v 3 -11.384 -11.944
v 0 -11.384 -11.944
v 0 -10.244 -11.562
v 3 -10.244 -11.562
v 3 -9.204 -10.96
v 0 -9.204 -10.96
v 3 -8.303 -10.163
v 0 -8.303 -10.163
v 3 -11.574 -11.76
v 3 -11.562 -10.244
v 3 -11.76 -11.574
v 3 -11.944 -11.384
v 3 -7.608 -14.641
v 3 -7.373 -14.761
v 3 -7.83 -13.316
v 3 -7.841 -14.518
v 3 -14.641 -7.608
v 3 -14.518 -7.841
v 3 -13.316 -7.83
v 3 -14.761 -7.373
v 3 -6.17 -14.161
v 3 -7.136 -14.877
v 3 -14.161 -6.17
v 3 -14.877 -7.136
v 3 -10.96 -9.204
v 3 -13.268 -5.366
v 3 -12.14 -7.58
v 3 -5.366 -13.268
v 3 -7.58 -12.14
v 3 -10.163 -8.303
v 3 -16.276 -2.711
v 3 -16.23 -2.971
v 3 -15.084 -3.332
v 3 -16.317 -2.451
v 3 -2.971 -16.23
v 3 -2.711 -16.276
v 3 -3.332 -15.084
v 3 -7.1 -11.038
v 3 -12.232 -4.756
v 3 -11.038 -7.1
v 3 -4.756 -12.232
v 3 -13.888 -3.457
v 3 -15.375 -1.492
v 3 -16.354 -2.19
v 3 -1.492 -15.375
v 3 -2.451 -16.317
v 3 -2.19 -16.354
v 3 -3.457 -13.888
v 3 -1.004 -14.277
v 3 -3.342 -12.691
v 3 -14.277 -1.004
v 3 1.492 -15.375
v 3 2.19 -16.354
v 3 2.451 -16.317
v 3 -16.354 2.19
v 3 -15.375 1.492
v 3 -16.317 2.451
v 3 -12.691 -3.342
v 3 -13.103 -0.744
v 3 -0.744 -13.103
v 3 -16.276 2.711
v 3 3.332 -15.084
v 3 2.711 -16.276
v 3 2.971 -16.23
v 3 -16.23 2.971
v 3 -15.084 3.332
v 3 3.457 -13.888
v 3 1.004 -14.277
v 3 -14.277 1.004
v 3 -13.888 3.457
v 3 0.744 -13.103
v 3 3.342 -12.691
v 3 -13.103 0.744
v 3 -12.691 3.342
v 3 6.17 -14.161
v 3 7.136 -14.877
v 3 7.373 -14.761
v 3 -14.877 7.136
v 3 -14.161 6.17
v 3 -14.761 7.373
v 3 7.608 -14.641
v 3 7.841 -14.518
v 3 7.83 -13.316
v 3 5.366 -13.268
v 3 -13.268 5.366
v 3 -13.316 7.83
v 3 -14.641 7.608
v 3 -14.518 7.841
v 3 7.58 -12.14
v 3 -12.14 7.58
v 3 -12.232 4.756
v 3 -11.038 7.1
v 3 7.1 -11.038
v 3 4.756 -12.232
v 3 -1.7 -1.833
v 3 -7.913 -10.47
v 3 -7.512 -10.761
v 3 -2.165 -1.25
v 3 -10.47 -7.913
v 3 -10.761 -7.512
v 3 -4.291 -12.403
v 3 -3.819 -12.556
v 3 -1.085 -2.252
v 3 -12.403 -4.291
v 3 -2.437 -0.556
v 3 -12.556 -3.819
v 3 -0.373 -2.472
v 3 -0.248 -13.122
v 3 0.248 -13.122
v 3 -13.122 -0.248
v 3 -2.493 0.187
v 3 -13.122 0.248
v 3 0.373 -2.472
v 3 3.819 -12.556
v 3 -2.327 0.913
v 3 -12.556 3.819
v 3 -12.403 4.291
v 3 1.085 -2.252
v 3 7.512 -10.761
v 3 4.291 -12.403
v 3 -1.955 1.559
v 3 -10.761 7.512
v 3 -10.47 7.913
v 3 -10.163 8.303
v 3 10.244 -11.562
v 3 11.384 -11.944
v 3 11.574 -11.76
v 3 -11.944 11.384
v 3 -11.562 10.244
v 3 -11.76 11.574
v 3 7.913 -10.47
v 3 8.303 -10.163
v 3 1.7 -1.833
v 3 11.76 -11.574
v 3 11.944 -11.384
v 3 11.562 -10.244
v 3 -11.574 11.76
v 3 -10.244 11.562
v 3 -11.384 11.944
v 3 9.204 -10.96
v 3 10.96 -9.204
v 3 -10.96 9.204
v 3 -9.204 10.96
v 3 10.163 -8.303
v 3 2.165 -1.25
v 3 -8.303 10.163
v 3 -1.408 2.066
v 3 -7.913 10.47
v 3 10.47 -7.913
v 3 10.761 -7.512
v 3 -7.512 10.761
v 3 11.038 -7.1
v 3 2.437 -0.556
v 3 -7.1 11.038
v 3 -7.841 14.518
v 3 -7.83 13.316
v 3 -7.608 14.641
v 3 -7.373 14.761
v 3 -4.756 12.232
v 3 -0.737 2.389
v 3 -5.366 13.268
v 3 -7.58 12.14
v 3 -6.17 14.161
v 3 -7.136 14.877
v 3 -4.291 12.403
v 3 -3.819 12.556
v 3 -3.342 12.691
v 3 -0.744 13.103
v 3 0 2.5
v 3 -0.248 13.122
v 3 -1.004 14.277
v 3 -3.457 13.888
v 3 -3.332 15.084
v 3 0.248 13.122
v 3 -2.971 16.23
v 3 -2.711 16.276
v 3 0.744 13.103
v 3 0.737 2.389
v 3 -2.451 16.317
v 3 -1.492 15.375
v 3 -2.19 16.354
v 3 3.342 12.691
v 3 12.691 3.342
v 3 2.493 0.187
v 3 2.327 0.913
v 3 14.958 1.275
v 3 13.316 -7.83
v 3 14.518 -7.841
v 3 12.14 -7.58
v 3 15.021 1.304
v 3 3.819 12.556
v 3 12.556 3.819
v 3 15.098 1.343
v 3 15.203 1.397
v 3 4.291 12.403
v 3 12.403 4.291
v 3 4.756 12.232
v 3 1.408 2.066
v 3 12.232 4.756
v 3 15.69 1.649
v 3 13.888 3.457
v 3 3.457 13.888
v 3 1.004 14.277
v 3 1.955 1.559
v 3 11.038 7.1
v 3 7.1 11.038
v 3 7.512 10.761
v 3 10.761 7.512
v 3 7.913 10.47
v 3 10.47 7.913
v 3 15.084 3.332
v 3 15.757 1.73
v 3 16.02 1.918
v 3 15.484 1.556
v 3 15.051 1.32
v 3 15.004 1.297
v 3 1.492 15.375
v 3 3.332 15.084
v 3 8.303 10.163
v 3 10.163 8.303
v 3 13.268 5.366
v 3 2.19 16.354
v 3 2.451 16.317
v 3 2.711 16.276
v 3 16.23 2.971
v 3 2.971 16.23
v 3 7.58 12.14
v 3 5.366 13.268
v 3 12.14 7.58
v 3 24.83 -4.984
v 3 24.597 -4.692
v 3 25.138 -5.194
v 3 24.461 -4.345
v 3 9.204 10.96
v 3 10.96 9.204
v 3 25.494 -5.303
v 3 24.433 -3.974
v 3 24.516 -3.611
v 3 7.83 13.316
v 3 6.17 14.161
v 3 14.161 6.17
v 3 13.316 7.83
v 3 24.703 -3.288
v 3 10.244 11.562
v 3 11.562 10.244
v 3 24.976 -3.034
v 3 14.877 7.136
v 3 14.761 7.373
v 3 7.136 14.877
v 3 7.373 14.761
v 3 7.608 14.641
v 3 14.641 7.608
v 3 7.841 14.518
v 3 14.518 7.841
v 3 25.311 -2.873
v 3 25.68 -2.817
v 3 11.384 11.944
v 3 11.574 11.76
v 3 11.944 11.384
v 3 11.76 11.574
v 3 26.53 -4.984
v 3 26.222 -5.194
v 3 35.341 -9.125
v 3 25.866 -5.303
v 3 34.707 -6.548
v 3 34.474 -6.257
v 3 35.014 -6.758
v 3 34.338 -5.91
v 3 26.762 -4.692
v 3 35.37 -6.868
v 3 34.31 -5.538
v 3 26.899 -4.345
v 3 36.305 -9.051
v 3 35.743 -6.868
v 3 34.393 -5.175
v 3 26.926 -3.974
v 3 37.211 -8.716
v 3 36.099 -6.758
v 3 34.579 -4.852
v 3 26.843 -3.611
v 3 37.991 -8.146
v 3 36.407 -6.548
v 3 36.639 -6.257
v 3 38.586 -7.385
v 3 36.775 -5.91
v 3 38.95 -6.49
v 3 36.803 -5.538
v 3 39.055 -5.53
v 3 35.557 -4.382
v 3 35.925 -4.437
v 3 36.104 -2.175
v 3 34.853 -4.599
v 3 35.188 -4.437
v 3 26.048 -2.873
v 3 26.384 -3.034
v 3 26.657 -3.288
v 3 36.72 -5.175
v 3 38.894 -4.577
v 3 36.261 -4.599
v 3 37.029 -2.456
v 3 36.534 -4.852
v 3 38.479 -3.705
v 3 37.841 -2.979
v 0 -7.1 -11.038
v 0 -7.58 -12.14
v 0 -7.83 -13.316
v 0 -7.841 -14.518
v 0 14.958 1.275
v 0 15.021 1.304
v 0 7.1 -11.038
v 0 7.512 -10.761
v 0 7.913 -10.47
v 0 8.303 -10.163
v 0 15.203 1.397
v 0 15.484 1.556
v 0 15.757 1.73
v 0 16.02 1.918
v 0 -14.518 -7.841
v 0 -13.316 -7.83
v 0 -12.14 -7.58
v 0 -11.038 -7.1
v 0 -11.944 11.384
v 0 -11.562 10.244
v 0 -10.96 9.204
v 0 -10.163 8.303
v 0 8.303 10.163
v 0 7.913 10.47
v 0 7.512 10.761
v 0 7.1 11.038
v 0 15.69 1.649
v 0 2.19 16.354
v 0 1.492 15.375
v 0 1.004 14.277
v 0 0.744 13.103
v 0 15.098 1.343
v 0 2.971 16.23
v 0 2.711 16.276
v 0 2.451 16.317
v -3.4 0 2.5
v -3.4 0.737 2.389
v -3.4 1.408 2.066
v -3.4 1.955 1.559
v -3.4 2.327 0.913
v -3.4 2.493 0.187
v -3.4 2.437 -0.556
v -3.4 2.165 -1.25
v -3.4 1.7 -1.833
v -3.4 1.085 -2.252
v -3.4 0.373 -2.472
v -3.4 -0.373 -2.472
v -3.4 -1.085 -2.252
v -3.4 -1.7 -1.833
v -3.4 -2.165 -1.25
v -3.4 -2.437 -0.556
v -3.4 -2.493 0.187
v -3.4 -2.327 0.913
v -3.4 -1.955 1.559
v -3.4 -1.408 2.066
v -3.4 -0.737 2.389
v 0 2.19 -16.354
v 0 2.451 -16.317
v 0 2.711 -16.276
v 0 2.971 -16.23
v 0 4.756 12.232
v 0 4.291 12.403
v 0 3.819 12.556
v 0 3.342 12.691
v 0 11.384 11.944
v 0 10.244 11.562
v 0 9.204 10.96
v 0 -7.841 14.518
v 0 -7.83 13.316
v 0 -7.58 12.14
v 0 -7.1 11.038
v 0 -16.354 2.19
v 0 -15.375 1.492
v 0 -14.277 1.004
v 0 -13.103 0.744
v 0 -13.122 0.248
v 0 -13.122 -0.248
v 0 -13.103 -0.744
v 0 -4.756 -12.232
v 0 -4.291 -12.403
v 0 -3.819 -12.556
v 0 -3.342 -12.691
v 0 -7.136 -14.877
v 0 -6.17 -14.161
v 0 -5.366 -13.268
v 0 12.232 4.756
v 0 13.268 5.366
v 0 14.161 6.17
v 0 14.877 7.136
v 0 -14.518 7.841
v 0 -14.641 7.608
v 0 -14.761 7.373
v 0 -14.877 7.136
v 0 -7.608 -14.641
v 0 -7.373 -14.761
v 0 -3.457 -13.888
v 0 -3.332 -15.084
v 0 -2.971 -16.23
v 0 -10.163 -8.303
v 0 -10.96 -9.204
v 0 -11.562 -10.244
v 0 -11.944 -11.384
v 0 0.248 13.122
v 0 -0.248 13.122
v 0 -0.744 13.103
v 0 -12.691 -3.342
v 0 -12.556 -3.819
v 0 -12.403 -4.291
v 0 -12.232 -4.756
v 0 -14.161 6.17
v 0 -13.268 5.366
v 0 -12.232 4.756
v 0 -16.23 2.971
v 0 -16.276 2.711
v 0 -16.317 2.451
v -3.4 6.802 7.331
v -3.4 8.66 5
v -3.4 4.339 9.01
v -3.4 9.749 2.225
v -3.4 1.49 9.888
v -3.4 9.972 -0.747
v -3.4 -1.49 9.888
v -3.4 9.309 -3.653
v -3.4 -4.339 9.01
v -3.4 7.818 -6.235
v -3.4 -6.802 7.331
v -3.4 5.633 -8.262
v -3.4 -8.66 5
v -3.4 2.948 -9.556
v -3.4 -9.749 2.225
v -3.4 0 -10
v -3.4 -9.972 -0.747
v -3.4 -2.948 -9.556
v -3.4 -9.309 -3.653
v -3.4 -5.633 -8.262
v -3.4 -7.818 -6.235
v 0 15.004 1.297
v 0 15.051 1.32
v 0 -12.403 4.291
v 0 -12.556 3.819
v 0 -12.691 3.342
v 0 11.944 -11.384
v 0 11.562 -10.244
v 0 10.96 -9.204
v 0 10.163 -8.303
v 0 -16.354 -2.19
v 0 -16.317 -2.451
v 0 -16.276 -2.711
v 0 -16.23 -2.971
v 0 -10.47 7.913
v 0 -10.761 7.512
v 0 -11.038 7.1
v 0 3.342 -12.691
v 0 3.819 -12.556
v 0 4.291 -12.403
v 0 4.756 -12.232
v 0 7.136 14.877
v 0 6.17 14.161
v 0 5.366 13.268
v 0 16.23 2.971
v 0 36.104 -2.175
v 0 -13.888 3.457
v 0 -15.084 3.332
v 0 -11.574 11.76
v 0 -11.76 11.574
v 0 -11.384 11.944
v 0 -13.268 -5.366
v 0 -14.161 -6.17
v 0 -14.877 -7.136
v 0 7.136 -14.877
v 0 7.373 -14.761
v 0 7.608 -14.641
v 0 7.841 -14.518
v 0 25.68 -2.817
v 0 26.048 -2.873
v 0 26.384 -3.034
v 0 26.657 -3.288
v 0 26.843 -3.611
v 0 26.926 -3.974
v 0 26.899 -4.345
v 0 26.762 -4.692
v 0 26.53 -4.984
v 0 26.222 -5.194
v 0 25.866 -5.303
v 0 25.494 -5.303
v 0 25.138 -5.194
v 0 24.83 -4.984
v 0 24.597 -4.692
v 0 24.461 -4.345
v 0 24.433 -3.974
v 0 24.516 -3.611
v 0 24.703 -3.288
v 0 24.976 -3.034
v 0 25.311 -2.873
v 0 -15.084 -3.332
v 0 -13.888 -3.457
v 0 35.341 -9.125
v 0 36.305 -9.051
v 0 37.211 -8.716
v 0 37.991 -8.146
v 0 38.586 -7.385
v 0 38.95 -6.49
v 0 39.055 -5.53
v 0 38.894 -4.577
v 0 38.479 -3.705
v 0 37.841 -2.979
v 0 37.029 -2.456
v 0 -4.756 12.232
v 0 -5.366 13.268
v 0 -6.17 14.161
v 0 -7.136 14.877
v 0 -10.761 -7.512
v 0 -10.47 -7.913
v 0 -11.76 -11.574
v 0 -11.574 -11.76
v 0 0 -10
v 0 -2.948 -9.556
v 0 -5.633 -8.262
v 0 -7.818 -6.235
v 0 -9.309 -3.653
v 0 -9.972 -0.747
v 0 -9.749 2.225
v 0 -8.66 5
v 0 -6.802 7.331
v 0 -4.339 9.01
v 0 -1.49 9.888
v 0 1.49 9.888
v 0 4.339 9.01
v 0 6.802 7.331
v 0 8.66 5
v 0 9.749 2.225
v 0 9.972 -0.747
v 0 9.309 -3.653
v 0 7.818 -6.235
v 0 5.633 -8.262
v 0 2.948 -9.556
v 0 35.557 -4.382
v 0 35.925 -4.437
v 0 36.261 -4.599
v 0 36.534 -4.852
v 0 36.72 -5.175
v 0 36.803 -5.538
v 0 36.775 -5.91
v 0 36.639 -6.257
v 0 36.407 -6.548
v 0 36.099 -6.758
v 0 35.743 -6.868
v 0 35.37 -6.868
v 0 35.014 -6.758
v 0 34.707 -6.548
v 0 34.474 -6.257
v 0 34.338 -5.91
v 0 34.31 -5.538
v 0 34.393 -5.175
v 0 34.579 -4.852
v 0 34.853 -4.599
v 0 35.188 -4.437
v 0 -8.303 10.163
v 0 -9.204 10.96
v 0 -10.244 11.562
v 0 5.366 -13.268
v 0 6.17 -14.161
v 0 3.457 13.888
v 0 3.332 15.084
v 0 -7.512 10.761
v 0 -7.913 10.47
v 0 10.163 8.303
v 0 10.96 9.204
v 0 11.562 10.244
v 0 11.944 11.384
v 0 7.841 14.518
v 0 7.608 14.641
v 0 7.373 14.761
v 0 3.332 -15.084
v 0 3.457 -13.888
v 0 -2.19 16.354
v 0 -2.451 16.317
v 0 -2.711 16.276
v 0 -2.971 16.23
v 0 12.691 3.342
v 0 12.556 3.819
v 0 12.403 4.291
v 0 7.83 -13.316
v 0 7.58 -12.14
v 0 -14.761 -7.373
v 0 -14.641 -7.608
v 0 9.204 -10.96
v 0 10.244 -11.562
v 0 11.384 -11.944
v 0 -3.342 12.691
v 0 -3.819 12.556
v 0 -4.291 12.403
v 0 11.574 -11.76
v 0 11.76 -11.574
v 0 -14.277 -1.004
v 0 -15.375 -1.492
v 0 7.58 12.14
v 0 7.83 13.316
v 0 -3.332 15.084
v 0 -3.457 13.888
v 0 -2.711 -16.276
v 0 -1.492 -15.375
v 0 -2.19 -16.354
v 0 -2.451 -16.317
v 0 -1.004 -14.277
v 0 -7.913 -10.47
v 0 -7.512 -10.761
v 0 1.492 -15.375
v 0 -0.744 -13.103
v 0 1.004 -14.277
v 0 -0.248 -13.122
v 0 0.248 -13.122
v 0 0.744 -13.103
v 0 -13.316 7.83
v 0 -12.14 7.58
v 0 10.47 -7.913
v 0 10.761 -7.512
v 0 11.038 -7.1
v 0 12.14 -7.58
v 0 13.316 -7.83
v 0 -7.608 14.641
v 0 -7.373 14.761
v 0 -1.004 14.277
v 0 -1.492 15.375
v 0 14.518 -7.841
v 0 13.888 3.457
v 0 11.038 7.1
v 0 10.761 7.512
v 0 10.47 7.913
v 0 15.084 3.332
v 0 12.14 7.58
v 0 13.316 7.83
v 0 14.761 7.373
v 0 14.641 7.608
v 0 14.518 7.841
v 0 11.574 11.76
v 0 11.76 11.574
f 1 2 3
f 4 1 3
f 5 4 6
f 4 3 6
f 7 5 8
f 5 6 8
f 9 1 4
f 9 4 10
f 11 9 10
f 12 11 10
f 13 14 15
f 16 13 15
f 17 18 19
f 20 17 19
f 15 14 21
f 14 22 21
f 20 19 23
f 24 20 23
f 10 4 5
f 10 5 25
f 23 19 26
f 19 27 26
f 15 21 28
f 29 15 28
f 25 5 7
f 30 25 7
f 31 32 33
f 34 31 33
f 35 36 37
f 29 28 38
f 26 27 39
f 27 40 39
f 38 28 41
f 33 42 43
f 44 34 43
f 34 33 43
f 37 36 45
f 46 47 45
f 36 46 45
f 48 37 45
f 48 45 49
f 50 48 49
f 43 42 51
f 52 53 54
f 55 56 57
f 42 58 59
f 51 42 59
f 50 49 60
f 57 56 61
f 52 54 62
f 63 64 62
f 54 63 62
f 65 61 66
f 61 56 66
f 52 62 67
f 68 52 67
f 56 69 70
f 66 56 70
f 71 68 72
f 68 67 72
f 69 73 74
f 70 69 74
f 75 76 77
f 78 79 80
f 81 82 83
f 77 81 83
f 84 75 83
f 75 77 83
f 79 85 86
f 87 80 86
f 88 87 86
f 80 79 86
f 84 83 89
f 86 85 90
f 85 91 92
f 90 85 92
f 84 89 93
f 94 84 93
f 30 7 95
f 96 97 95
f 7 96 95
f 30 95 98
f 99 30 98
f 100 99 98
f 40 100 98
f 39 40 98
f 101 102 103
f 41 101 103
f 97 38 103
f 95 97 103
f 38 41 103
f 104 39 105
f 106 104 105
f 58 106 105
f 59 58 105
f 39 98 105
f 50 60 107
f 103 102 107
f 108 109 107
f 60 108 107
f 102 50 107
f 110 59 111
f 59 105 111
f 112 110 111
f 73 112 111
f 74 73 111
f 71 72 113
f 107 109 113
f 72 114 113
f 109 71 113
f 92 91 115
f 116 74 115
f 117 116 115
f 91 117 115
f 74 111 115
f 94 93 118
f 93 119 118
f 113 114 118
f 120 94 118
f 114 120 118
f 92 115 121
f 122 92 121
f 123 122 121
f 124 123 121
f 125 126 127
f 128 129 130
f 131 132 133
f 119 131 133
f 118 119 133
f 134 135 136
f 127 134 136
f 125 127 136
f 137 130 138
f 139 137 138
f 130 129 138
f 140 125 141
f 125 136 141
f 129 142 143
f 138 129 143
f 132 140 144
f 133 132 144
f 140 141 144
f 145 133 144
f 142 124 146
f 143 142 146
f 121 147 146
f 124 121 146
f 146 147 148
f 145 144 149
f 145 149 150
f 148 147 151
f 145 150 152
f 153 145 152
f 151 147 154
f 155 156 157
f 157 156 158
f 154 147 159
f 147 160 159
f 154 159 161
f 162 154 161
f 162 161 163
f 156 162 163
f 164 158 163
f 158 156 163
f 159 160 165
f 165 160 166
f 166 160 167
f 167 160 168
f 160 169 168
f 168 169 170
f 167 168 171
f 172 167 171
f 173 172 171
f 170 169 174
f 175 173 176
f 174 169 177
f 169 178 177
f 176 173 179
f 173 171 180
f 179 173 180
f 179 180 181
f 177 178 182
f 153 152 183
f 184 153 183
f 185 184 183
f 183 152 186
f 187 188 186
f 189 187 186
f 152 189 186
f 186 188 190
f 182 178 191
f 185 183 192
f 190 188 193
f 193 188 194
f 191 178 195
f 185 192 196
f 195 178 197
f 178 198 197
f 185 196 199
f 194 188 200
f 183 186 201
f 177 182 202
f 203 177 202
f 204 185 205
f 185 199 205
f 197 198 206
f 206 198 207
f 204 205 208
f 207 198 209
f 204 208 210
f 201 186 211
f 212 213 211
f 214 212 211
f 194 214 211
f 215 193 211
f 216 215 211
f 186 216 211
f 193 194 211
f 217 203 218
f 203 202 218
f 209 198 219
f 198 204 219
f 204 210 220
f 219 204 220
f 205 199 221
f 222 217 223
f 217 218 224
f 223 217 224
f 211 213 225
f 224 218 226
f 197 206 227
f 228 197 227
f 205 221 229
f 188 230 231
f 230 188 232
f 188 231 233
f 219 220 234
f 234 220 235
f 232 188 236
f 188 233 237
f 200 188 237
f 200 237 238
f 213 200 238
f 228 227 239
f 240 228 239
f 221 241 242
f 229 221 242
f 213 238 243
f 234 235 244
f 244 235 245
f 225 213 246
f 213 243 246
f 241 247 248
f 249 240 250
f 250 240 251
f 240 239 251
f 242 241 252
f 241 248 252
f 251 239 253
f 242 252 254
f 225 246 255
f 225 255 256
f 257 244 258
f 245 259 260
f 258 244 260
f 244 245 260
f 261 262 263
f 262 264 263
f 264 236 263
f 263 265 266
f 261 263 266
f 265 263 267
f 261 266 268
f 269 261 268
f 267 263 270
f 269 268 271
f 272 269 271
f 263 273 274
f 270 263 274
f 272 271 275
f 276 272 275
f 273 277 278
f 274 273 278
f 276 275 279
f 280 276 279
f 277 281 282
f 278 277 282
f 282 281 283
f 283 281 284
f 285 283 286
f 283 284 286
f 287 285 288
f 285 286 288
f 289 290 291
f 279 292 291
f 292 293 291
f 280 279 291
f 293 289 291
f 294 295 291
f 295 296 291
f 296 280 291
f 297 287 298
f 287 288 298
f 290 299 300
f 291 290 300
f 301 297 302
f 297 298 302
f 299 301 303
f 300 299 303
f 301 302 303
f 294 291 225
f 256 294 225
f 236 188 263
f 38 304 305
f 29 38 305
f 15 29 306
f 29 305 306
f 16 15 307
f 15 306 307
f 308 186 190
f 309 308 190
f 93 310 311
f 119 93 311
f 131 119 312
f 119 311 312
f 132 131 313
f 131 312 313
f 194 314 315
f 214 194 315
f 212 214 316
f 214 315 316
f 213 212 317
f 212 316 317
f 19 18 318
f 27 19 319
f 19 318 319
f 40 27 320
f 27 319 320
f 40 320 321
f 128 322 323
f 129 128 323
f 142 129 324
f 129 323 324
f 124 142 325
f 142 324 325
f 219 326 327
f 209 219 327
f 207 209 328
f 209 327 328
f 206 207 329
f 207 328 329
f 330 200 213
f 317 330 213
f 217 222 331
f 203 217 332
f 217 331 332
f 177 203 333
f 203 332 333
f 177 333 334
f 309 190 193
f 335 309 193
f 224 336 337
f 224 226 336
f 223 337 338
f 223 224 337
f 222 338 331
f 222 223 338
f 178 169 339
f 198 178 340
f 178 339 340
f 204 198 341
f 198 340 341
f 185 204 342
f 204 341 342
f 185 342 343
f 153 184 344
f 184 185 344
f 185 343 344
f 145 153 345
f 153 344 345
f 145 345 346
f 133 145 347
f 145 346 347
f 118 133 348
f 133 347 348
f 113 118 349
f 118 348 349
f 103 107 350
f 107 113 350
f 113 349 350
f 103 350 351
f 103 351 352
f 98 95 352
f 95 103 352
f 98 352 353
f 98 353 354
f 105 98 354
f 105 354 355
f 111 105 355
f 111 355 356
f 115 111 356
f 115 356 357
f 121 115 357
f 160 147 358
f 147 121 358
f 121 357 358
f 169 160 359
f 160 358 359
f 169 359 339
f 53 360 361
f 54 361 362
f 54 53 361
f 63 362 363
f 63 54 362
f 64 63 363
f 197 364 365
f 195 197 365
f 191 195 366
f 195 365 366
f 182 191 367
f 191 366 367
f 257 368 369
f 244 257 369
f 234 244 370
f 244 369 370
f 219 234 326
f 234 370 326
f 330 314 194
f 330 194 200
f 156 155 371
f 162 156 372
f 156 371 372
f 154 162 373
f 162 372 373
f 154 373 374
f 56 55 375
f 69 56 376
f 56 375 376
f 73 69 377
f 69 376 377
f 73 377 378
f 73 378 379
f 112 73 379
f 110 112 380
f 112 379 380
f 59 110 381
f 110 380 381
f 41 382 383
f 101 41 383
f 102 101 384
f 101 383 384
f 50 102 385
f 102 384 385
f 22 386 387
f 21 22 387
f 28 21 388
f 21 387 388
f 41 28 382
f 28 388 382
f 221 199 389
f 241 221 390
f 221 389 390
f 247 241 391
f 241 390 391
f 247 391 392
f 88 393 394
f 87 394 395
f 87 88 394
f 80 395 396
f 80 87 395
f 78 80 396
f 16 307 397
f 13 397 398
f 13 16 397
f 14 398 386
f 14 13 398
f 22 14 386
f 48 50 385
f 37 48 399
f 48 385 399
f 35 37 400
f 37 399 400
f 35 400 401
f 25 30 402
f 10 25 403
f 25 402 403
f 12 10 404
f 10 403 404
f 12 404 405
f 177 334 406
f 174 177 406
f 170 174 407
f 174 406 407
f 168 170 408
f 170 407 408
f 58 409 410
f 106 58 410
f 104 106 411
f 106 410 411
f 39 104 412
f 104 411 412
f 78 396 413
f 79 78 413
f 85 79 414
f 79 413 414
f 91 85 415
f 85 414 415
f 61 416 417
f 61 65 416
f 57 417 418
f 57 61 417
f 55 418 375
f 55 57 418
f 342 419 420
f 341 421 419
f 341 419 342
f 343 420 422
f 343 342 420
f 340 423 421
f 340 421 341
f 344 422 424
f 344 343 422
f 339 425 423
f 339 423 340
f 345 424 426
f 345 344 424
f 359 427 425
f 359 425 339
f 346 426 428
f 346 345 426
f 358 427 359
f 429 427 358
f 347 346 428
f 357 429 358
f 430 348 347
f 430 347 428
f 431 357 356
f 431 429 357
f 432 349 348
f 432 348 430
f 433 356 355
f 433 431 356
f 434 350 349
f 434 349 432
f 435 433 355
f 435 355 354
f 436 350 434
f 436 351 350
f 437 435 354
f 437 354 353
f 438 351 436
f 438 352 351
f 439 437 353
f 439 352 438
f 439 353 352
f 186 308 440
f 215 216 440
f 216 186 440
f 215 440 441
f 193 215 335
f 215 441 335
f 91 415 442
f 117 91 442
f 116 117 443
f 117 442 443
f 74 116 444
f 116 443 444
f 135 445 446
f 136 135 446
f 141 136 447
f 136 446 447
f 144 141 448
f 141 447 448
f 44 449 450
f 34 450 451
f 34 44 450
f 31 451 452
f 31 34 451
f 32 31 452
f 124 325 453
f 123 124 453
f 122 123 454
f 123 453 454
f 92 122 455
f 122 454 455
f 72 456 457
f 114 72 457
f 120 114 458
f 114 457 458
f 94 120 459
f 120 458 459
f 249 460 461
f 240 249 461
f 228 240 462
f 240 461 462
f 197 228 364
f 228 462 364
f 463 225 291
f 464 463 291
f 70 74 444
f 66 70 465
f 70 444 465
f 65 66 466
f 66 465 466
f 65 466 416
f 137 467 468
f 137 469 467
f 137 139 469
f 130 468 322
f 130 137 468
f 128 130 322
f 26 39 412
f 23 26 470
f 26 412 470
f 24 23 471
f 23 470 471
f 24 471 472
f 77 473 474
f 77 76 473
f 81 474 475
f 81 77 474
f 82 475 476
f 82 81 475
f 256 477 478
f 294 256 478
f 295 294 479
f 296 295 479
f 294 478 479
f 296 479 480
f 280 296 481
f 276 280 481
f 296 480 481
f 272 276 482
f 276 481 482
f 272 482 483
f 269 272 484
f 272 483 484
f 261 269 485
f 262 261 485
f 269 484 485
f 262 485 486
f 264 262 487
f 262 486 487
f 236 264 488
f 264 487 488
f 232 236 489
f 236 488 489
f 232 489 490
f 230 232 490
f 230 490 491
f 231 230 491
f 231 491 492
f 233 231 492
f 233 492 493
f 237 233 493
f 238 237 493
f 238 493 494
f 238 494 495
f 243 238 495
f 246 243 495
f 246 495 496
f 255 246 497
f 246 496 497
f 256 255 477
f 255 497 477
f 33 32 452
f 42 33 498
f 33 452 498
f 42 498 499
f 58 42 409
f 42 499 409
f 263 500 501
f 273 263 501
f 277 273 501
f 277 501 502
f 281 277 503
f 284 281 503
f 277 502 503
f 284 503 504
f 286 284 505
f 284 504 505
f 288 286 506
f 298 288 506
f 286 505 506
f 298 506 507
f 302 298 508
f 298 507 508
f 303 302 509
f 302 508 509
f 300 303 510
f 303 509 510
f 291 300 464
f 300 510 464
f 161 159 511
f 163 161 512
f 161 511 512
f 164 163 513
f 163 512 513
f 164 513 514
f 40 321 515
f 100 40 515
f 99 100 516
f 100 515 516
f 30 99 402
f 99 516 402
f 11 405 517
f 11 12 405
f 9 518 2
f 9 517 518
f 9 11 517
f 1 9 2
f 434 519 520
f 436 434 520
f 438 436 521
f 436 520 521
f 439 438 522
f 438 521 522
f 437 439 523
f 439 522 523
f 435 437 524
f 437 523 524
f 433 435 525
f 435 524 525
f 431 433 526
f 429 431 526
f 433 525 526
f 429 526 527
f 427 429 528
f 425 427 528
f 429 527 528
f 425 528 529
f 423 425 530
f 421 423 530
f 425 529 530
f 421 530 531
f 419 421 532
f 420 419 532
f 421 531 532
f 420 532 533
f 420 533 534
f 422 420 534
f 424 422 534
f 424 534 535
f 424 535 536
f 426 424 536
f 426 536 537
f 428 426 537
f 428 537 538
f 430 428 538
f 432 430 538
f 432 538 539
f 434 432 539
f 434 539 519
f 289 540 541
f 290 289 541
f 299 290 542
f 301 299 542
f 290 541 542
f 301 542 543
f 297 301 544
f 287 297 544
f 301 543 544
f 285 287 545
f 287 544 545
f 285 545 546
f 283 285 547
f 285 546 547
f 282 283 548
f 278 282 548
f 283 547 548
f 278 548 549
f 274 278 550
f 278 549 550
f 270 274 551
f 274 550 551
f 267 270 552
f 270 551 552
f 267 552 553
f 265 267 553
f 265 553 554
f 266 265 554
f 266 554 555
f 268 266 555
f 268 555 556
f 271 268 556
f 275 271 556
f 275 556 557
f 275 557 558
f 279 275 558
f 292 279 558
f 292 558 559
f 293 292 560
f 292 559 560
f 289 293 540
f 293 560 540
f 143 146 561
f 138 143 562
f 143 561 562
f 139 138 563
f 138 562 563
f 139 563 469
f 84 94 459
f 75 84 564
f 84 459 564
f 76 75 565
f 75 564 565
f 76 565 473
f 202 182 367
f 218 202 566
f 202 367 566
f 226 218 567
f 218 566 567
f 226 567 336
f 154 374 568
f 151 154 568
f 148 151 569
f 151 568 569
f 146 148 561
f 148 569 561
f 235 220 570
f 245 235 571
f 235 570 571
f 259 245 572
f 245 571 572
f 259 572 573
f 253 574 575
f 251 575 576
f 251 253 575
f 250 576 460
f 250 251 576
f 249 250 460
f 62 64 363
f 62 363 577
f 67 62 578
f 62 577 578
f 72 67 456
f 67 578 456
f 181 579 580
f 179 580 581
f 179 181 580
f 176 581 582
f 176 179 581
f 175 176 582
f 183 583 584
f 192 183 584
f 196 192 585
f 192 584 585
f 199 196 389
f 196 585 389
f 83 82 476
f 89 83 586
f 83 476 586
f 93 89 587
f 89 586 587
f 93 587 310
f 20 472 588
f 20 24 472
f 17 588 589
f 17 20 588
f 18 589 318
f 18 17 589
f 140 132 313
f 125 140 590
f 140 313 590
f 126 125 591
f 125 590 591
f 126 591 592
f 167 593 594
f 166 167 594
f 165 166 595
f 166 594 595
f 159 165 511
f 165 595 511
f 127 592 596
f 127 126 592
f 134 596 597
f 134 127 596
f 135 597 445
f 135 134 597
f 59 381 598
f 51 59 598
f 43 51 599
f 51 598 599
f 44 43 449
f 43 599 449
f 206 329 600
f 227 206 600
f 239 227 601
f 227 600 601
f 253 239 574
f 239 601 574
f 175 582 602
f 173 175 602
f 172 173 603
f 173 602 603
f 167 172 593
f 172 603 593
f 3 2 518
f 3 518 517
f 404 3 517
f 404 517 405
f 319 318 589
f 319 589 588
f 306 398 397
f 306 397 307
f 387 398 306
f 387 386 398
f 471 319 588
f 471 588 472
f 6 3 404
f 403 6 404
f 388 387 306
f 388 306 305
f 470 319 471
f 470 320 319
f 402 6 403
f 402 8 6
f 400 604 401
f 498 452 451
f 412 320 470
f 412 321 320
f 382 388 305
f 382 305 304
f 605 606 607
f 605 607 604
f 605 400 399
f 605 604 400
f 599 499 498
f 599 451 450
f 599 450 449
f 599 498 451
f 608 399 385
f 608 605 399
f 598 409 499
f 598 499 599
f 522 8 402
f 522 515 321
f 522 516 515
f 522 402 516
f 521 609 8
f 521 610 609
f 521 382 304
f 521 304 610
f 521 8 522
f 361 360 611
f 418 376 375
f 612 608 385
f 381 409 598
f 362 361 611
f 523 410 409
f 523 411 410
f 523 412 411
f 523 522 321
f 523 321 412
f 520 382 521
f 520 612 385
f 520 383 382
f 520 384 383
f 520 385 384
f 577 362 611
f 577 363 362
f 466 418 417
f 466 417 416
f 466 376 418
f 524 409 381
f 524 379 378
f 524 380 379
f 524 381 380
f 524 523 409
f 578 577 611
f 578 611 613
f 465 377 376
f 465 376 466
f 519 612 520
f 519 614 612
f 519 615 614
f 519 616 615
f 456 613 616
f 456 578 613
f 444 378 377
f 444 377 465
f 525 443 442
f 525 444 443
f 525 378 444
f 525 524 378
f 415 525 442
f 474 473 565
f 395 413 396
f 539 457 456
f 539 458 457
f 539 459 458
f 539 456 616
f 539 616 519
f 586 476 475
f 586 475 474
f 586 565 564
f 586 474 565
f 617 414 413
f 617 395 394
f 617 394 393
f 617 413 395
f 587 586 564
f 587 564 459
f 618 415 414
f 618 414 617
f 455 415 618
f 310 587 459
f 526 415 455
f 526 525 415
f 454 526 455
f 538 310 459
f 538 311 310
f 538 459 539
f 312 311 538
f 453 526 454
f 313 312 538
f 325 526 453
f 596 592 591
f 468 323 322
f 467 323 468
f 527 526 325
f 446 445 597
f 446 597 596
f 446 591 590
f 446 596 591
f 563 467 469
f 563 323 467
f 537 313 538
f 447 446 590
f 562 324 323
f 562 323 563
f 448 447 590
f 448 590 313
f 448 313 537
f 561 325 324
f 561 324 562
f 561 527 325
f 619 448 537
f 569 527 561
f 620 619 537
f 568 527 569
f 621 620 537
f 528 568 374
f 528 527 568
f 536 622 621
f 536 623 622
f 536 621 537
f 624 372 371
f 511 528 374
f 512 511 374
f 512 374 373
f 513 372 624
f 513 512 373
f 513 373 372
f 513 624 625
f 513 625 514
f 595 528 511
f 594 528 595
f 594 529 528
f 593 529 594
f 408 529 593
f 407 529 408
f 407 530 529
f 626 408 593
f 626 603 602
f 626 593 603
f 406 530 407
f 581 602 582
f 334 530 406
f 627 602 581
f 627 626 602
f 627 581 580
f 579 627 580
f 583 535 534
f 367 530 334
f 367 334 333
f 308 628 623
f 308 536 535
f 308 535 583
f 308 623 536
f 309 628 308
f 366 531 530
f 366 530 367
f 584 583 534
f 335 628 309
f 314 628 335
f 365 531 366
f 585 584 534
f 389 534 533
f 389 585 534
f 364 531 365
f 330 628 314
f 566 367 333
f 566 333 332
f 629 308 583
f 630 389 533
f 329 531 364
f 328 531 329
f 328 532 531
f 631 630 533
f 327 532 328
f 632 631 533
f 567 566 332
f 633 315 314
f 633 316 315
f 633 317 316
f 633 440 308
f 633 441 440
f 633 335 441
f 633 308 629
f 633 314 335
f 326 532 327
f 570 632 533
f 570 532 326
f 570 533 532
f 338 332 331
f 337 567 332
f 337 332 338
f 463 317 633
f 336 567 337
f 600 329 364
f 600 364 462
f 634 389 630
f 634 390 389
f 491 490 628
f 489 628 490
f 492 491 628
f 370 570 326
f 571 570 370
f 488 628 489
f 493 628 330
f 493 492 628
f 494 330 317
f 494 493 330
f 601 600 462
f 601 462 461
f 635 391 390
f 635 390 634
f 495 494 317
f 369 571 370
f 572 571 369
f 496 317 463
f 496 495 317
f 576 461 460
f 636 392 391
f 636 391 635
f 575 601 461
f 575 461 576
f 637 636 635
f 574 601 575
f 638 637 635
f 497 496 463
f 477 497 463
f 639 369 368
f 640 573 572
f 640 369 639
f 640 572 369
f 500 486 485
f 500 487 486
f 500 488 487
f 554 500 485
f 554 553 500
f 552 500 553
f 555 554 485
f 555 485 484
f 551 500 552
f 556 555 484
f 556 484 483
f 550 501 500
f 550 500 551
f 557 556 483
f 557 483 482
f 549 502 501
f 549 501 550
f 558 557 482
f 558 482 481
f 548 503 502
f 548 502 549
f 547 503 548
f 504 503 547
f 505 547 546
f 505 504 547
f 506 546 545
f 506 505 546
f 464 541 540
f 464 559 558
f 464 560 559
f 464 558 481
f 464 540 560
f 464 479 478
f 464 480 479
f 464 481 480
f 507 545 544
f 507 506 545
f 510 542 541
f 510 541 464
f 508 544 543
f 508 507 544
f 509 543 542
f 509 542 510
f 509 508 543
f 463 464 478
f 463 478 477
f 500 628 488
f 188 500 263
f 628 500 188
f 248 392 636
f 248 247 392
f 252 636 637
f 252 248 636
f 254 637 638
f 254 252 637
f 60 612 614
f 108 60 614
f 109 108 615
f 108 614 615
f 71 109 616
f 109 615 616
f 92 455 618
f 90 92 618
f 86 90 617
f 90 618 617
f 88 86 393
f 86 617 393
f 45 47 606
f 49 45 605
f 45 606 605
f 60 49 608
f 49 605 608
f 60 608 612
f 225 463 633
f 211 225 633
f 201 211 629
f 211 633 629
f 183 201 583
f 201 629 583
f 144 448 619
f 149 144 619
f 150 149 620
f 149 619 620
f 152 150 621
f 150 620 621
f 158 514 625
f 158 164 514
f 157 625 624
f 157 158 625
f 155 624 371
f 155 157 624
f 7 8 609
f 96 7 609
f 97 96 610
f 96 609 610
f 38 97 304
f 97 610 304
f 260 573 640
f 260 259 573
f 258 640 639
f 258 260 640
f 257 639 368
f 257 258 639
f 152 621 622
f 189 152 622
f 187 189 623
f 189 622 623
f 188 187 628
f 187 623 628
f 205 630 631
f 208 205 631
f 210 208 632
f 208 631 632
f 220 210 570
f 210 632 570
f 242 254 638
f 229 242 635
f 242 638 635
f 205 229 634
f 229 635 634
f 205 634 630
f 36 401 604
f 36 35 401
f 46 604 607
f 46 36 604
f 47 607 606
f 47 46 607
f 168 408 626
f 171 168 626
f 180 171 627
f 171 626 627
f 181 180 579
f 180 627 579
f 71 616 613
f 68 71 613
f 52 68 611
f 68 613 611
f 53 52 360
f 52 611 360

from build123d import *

# Parameters (mm, degrees)
BASPROSKE_W         = 3
BASPROSKE_H         = 16.5
TOOTHCUT_DEPTH      = 24.526580712
TEETHCUTS_COUNT     = 20
TEETHCUTS_ANGLE     = 342
SKETCH_3_R          = 2.5
CUT_EXTRUDE_2_DEPTH = 10
SKETCH_4_R          = 10
EXTRUDE_4_DEPTH     = 3.4
SKETCH_6_R          = 2.5
CUT_EXTRUDE_3_DEPTH = 24.997285258
SKETCH_2_R          = 1.25
EXTRUDE_5_DEPTH     = 3
SKETCH_7_R          = 2.5
CUT_EXTRUDE_4_DEPTH = 43.823439076
EXTRUDE_6_DEPTH     = 3
EXTRUDE_START       = -3
EXTRUDE_14_DEPTH    = 3


with BuildPart() as part:
    # BasProSke → Base-Revolve (revolve)
    with BuildSketch(Plane(origin=(0, 0, 0), x_dir=(1, 0, 0), z_dir=(0, 1, 0)), mode=Mode.PRIVATE) as base_revolve_sk:
        with Locations((1.5, 8.25)):
            Rectangle(BASPROSKE_W, BASPROSKE_H)
    revolve(base_revolve_sk.sketch.rotate(Axis((-10, 0, 0), (1, 0, 0)), 180), axis=Axis((-10, 0, 0), (1, 0, 0)))

    # TooCutSke → ToothCut (cut, through all)
    with BuildSketch(Plane(origin=(0, 0, 0), x_dir=(0, 0, -1), z_dir=(1, 0, 0))):
        with BuildLine():
            ThreePointArc((0.74381438, 13.102904875), (0, 13.124), (-0.74381438, 13.102904875))
            ThreePointArc((-0.74381438, 13.102904875), (-1.226473103, 14.852072512), (-2.209965745, 16.376962373))
            ThreePointArc((-2.209965745, 16.376962373), (0, 16.5254), (2.209965745, 16.376962373))
            ThreePointArc((2.209965745, 16.376962373), (1.226473103, 14.852072512), (0.74381438, 13.102904875))
        make_face()
    toothcut = extrude(amount=TOOTHCUT_DEPTH, mode=Mode.SUBTRACT)

    # TeethCuts: ToothCut ×20 about axis
    teethcuts_axis = Axis((-10, 0, 0), (1, 0, 0))
    for i in range(1, TEETHCUTS_COUNT):
        add(toothcut.rotate(teethcuts_axis, i * TEETHCUTS_ANGLE / (TEETHCUTS_COUNT - 1)), mode=Mode.SUBTRACT)

    # 草图3 → 切除-拉伸2 (cut)
    with BuildSketch(Plane.ZY):
        Circle(SKETCH_3_R)
        with Locations((0, 27)):
            Circle(SKETCH_3_R)
    extrude(amount=-CUT_EXTRUDE_2_DEPTH, mode=Mode.SUBTRACT)

    # 草图4 → 凸台-拉伸4 (add)
    with BuildSketch(Plane.ZY):
        with Locations(Location((0, 0, 0), (0, 0, 180))):
            Circle(SKETCH_4_R)
    extrude(amount=EXTRUDE_4_DEPTH)

    # 草图6 → 切除-拉伸3 (cut, through all)
    with BuildSketch(Plane.ZY.offset(3.4)):
        Circle(SKETCH_6_R)
    extrude(amount=-CUT_EXTRUDE_3_DEPTH, mode=Mode.SUBTRACT)

    # 草图2 → 凸台-拉伸5 (add)
    with BuildSketch(Plane.ZY):
        with BuildLine():
            Line((-3.456909192, -0.547520628), (-9.088549934, 35.009259634))
            ThreePointArc((-9.088549934, 35.009259634), (-6.179161369, 39.013689454), (-2.174731549, 36.104300889))
            Line((-2.174731549, 36.104300889), (3.456909192, 0.547520628))
            ThreePointArc((3.456909192, 0.547520628), (0.547520628, -3.456909192), (-3.456909192, -0.547520628))
        make_face()
        with Locations((-4.067296091, 25.679896855)):
            Circle(SKETCH_2_R, mode=Mode.SUBTRACT)
        with Locations((-5.631640741, 35.556780261)):
            Circle(SKETCH_2_R, mode=Mode.SUBTRACT)
    extrude(amount=-EXTRUDE_5_DEPTH)

    # 草图7 → 切除-拉伸4 (cut, through all)
    with BuildSketch(Plane(origin=(3, 0, 0), x_dir=(0, 0, -1), z_dir=(1, 0, 0))):
        with Locations(Location((0, 0, 0), (0, 0, 180))):
            Circle(SKETCH_7_R)
    extrude(amount=-CUT_EXTRUDE_4_DEPTH, mode=Mode.SUBTRACT)

    # 草图8 → 凸台-拉伸6 (add)
    with BuildSketch(Plane.ZY):
        Polygon((-7.841095822, 14.51782409), (-7.136285925, 14.87694267), (-5.713237213, 13.698373831), (-9.125006953, 35.341391045), align=None)
    extrude(amount=-EXTRUDE_6_DEPTH)

    # 草图9 → 凸台-拉伸14 (add)
    with BuildSketch(Plane.ZY.offset(EXTRUDE_START)):
        with BuildLine():
            Line((2.971070911, 16.230303067), (-2.174731549, 36.104300889))
            Line((-2.174731549, 36.104300889), (1.200581171, 14.793415086))
            Line((1.200581171, 14.793415086), (1.303832307, 15.021332463))
            Line((1.303832307, 15.021332463), (1.648552458, 15.68967923))
            Line((1.648552458, 15.68967923), (2.189783121, 16.354046896))
            ThreePointArc((2.189783121, 16.354046896), (2.581168673, 16.29685762), (2.971070911, 16.230303067))
        make_face()
    extrude(amount=EXTRUDE_14_DEPTH)


solid = part.part
